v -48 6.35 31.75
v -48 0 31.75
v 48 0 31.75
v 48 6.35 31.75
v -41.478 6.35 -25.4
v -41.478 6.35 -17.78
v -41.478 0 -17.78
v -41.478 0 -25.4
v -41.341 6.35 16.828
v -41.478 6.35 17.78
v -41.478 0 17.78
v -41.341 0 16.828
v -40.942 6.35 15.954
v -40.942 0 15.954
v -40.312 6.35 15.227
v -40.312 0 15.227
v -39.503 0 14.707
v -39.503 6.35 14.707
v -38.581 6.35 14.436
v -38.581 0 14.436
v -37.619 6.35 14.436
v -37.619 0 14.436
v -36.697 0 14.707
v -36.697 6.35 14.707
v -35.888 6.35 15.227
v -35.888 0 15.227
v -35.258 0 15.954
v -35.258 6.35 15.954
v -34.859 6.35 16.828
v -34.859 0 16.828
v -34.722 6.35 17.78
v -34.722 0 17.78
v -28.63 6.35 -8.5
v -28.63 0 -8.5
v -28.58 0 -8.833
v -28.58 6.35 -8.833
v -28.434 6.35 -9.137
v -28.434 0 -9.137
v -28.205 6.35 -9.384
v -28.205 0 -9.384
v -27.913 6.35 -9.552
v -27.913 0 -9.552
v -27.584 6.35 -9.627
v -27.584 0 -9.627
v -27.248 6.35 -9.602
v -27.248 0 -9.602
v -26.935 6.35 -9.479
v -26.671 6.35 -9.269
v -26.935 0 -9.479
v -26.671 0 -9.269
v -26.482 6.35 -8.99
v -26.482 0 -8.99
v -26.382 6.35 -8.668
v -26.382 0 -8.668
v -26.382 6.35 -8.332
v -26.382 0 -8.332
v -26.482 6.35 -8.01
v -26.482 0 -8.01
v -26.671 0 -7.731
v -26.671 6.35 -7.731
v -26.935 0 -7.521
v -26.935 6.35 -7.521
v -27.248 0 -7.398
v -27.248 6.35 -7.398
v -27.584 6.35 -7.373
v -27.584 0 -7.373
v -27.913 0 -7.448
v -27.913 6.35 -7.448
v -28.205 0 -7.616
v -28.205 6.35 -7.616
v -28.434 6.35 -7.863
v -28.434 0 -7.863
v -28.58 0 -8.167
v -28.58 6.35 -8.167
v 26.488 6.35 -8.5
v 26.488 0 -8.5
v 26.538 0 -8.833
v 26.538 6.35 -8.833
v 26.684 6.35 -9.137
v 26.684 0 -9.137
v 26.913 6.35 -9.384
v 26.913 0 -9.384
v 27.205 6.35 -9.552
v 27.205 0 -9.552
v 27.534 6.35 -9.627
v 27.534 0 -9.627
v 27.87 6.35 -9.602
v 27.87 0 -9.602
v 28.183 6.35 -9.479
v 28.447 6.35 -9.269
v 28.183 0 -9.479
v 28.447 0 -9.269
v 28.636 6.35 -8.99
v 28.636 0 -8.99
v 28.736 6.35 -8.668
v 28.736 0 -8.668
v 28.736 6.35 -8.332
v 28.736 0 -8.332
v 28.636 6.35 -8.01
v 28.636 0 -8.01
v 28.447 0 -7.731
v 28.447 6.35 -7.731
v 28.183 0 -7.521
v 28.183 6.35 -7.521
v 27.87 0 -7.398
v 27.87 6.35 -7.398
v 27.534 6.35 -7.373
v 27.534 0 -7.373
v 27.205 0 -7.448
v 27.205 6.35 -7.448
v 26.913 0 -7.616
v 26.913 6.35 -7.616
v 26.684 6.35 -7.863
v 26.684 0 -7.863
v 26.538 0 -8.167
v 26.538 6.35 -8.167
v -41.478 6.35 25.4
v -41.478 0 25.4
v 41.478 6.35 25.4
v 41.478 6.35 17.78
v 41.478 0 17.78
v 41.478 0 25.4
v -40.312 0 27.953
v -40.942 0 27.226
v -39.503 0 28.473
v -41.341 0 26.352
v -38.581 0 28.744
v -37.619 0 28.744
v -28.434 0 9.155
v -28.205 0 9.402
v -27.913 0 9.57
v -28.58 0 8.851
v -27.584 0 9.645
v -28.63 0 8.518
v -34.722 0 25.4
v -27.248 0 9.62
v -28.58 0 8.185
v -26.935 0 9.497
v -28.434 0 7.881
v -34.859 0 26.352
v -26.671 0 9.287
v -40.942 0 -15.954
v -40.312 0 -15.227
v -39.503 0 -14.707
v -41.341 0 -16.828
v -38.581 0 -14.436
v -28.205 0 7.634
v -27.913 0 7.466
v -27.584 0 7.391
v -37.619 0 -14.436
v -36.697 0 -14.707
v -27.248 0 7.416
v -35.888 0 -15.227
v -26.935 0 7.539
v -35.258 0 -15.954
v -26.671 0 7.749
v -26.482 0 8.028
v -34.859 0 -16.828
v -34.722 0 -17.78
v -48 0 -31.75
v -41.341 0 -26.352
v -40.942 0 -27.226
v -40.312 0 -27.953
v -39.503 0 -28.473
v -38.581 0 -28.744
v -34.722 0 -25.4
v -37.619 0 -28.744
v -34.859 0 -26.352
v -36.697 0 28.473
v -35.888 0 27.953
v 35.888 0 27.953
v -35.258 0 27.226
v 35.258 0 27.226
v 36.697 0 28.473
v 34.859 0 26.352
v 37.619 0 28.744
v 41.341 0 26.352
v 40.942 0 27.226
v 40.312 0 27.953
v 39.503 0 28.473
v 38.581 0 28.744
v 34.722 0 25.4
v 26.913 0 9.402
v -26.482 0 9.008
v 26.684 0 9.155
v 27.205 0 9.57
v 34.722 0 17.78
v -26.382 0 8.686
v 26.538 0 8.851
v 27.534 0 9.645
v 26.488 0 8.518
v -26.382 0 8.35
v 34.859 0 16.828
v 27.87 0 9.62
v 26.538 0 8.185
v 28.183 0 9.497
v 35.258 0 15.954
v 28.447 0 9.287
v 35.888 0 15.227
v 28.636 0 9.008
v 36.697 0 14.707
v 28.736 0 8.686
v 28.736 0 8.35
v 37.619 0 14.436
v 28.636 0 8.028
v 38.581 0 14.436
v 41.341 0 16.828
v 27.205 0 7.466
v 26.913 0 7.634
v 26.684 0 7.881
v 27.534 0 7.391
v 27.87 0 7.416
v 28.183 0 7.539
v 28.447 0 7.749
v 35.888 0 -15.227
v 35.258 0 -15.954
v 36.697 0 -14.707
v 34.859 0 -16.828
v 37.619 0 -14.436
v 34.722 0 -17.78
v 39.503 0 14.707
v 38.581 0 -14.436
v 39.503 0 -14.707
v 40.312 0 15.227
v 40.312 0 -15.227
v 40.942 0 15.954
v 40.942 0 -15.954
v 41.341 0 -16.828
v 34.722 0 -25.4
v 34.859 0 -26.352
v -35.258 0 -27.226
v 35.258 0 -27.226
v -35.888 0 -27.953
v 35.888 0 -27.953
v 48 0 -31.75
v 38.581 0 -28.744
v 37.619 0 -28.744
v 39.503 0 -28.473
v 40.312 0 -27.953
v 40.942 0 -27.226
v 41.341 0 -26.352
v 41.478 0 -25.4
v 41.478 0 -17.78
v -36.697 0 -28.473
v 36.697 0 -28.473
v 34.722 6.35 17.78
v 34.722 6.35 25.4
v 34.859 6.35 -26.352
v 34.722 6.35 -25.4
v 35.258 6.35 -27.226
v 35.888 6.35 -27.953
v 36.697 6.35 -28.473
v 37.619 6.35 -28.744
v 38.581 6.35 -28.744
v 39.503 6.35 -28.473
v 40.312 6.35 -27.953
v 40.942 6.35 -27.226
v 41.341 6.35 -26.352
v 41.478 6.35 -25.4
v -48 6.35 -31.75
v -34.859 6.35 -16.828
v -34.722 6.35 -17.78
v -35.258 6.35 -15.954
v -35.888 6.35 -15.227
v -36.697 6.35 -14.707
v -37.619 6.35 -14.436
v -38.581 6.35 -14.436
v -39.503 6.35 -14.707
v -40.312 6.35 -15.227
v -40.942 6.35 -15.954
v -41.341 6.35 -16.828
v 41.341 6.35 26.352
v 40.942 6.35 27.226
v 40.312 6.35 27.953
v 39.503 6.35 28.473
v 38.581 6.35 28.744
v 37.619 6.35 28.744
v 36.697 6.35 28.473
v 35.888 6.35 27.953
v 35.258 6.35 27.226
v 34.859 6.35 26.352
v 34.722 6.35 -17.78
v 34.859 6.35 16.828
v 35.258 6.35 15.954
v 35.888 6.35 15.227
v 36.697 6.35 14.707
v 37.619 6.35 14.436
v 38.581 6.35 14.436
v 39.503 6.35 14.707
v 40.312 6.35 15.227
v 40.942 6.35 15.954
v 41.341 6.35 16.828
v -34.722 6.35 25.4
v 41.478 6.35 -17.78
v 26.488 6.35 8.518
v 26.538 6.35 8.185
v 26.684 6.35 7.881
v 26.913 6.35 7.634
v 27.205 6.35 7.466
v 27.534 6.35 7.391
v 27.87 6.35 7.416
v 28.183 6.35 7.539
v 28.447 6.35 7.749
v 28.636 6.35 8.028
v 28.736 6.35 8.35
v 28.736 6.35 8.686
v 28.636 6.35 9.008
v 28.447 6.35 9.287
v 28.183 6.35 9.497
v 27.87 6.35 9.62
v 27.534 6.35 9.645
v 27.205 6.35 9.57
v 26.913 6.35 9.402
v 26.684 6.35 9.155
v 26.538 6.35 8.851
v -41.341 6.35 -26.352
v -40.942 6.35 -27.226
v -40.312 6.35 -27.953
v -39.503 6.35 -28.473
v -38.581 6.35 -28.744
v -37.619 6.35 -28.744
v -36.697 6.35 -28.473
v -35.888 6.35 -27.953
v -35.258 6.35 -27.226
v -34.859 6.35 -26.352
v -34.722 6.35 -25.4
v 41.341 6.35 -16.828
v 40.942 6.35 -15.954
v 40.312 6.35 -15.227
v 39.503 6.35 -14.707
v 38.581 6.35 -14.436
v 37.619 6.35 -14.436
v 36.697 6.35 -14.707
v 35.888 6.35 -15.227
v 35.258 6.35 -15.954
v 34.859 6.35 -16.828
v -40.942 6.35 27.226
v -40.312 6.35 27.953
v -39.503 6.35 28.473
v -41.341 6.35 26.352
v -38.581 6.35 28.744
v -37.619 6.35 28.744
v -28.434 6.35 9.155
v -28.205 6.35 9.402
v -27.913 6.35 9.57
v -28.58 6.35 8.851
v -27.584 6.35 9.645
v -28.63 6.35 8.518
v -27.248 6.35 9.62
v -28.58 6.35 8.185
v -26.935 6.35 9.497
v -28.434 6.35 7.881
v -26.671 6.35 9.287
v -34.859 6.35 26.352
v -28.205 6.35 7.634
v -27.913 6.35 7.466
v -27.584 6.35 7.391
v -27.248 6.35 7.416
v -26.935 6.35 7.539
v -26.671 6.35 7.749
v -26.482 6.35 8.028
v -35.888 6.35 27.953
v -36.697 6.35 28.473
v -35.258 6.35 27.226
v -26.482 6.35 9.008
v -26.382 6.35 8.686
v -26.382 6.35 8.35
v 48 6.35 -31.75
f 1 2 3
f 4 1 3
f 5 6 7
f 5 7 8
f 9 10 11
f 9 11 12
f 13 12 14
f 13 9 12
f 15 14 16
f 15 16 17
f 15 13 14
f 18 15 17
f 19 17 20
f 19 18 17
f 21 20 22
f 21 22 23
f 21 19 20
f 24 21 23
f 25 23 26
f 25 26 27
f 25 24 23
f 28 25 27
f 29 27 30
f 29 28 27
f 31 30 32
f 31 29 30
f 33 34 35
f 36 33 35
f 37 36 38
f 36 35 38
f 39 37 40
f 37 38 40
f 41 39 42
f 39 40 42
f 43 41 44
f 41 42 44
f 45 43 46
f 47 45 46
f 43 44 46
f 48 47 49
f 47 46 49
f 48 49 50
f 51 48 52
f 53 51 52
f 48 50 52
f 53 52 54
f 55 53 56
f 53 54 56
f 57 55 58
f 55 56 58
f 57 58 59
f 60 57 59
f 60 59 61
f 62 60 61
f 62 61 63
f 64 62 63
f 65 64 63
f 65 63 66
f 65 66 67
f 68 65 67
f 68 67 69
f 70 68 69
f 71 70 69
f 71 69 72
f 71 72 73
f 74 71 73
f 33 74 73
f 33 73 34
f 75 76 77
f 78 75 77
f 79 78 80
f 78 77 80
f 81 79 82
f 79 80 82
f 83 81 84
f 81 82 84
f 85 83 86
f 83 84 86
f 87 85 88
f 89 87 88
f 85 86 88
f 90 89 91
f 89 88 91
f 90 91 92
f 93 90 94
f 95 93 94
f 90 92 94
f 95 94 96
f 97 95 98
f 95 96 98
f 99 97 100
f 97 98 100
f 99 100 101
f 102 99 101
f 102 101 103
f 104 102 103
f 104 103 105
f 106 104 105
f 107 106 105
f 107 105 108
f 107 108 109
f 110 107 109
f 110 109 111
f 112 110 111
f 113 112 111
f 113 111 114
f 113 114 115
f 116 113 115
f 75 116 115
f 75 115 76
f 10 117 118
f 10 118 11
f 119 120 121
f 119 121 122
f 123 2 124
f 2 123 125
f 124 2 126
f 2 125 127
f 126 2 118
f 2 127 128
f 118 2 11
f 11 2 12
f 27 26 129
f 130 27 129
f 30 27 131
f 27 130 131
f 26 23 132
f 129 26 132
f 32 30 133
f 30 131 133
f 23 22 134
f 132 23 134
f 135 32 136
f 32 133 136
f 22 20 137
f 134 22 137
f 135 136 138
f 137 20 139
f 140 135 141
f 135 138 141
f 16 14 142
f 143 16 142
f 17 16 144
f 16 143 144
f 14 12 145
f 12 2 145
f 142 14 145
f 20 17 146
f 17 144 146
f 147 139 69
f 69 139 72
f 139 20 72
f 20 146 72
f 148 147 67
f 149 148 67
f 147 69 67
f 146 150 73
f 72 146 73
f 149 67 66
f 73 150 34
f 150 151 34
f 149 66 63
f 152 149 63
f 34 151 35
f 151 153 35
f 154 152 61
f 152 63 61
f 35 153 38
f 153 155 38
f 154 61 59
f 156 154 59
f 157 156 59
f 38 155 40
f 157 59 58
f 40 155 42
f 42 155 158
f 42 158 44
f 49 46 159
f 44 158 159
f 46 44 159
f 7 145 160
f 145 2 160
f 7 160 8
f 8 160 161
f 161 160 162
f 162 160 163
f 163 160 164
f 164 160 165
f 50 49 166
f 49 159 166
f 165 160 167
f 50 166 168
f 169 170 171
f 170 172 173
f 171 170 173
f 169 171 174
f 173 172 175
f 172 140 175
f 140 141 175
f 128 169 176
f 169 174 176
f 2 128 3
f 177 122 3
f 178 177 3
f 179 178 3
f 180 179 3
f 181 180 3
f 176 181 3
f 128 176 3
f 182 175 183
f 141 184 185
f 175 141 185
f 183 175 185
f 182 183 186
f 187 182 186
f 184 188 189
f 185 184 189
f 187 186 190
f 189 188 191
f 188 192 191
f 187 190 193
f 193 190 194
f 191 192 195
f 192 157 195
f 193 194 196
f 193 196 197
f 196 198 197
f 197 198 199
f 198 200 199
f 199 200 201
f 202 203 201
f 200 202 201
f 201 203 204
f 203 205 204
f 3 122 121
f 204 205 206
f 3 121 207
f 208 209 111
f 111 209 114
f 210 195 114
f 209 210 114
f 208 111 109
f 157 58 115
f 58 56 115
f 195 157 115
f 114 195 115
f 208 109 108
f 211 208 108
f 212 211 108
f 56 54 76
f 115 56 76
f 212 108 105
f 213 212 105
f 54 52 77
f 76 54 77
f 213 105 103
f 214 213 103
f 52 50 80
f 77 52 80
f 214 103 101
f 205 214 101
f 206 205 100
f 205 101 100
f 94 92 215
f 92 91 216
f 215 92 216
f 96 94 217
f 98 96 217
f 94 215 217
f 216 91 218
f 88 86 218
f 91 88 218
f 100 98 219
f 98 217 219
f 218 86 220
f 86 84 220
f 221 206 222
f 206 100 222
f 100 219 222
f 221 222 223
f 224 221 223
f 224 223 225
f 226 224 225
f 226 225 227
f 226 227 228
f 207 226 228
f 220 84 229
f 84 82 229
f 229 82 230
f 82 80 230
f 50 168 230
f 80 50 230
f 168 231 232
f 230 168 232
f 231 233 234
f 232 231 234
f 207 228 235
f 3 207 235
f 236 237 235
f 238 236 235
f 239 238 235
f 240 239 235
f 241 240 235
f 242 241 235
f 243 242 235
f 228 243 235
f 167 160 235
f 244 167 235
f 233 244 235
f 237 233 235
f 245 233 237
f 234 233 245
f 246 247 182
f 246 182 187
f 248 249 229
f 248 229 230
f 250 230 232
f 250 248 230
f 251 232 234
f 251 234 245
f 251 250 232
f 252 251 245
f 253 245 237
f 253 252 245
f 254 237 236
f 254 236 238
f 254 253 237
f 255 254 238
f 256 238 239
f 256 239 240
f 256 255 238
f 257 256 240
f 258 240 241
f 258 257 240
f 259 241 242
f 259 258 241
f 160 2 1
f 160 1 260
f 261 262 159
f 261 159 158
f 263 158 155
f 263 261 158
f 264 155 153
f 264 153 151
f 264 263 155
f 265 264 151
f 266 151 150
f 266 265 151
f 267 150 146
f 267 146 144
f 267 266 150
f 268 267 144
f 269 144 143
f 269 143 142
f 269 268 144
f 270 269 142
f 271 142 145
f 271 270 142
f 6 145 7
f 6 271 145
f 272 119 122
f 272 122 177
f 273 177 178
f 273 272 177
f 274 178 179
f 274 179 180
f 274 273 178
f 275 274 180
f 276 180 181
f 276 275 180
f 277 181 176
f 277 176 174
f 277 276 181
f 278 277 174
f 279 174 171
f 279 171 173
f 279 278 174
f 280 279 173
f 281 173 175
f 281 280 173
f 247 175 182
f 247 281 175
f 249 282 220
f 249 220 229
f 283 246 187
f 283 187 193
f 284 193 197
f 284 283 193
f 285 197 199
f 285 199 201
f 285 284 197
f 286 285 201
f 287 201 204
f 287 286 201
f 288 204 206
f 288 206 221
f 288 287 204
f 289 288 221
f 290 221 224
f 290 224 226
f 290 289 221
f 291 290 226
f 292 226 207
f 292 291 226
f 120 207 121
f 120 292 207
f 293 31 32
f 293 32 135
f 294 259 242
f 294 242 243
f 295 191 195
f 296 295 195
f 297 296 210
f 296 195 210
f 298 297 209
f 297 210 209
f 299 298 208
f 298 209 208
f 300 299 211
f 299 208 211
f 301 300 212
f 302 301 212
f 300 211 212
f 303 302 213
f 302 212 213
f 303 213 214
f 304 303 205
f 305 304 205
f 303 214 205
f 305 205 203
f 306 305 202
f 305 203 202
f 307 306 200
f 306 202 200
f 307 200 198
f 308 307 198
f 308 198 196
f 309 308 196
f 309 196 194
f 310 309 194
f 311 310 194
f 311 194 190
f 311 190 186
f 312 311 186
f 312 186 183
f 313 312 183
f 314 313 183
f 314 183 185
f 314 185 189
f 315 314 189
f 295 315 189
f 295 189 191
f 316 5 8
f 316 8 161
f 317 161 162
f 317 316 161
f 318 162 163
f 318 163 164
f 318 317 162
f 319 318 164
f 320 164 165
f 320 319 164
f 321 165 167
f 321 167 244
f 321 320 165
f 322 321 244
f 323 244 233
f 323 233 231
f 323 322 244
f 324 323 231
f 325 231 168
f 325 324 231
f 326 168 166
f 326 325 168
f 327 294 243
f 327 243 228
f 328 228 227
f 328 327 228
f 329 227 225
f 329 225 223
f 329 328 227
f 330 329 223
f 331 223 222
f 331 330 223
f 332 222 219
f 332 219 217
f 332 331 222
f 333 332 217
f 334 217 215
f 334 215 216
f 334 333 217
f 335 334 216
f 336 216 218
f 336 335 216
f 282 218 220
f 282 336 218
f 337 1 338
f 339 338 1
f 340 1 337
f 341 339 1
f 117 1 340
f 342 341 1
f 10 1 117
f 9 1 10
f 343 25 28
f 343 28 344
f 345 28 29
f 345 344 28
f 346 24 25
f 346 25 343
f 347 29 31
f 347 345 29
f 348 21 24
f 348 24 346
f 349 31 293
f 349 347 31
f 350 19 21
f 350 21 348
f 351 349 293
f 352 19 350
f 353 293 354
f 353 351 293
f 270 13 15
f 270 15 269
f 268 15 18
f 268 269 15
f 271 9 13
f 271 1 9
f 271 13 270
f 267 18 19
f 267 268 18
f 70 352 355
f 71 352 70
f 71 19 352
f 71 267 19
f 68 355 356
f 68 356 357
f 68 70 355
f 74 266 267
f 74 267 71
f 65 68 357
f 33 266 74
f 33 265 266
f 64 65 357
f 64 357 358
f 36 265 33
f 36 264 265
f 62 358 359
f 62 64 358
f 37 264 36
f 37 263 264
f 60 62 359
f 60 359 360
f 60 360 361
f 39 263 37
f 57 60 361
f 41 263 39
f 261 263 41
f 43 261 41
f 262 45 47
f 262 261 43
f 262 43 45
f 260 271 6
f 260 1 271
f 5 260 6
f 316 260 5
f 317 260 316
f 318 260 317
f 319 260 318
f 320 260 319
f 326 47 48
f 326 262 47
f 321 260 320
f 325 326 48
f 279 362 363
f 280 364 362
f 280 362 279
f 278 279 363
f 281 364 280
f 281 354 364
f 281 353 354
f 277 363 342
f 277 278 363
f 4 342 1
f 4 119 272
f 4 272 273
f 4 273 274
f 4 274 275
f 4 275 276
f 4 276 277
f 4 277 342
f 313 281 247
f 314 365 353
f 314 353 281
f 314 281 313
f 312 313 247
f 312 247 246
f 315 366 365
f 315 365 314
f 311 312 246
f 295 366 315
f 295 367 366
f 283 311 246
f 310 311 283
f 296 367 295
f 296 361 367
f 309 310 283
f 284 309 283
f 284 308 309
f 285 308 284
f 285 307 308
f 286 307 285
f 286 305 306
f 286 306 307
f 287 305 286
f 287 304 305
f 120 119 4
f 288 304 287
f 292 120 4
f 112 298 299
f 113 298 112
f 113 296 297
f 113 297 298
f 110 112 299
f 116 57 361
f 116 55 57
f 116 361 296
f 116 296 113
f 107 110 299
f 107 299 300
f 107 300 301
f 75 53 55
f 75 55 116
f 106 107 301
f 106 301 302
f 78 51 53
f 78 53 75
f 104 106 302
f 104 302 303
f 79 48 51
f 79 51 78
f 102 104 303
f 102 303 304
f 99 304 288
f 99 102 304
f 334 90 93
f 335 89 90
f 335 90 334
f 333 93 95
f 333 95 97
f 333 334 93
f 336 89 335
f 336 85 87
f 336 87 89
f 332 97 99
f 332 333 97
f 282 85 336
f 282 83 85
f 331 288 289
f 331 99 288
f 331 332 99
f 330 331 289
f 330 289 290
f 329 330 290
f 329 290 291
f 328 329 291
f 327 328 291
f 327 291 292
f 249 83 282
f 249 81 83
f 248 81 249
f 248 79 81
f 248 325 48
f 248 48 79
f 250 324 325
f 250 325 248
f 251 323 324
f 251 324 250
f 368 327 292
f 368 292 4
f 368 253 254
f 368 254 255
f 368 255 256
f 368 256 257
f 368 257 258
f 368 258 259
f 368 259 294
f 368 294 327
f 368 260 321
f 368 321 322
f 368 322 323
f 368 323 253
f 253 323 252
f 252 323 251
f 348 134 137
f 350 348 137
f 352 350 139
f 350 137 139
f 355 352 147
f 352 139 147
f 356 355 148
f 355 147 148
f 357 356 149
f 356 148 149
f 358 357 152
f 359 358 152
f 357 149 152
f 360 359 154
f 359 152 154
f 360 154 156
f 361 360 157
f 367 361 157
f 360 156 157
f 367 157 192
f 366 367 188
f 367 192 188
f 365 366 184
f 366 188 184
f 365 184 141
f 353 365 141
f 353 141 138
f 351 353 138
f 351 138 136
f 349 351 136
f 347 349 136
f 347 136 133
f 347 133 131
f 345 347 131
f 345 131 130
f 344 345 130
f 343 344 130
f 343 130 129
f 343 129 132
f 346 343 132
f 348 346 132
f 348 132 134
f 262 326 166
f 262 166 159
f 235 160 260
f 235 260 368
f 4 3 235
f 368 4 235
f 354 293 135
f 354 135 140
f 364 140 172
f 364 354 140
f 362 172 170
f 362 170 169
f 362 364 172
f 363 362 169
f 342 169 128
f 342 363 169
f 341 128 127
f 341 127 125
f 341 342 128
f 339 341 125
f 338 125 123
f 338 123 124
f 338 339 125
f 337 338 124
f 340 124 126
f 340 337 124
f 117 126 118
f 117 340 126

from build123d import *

# Parameters (mm, degrees)
SKETCH1_W                              = 96
SKETCH1_H                              = 63.5
MOUNT_BLOCK_DEPTH                      = 6.35
LINEAR_STAGE_4_40_TAPPED_HOLE_D        = 2.2606
OPTICAL_TABLE_1_4_0_25_DIAMETER_HOLE_D = 6.35
OPTICAL_TASBLE_CUT_EXTRUDE_DEPTH       = 6.35


with BuildPart() as part:
    # Sketch1 → Mount Block (new body)
    with BuildSketch(Plane(origin=(0, 0, 0), x_dir=(1, 0, 0), z_dir=(0, 1, 0))):
        Rectangle(SKETCH1_W, SKETCH1_H)
    extrude(amount=MOUNT_BLOCK_DEPTH)

    # Linear Stage #4-40 Tapped Hole (through all)
    with Locations(Plane(origin=(0, 6.35, 0), x_dir=(1, 0, 0), z_dir=(0, 1, 0))):
        with Locations((-27.5, 8.5), (27.618, 8.5), (27.618, -8.518), (-27.5, -8.518)):
            Hole(LINEAR_STAGE_4_40_TAPPED_HOLE_D / 2)

    # Optical Table 1/4 (0.25) Diameter Hole (through all)
    with Locations(Plane(origin=(0, 6.35, 0), x_dir=(1, 0, 0), z_dir=(0, 1, 0))):
        with Locations((-38.1, 25.4), (38.1, 25.4), (38.1, -25.4), (-38.1, -25.4)):
            Hole(OPTICAL_TABLE_1_4_0_25_DIAMETER_HOLE_D / 2)

    # Sketch6 → Optical Tasble Cut-Extrude (cut)
    with BuildSketch(Plane(origin=(0, 6.35, 0), x_dir=(1, 0, 0), z_dir=(0, 1, 0))):
        with BuildLine():
            Line((-34.7218, 25.4), (-34.7218, 17.78))
            ThreePointArc((-34.7218, 17.78), (-38.1, 14.4018), (-41.4782, 17.78))
            Line((-41.4782, 17.78), (-41.4782, 25.4))
            ThreePointArc((-41.4782, 25.4), (-38.1, 28.7782), (-34.7218, 25.4))
        make_face()
        with BuildLine():
            Line((41.4782, 25.4), (41.4782, 17.78))
            ThreePointArc((41.4782, 17.78), (38.1, 14.4018), (34.7218, 17.78))
            Line((34.7218, 17.78), (34.7218, 25.4))
            ThreePointArc((34.7218, 25.4), (38.1, 28.7782), (41.4782, 25.4))
        make_face()
        with BuildLine():
            Line((41.4782, -17.78), (41.4782, -25.4))
            ThreePointArc((41.4782, -25.4), (38.1, -28.7782), (34.7218, -25.4))
            Line((34.7218, -25.4), (34.7218, -17.78))
            ThreePointArc((34.7218, -17.78), (38.1, -14.4018), (41.4782, -17.78))
        make_face()
        with BuildLine():
            Line((-34.7218, -17.78), (-34.7218, -25.4))
            ThreePointArc((-34.7218, -25.4), (-38.1, -28.7782), (-41.4782, -25.4))
            Line((-41.4782, -25.4), (-41.4782, -17.78))
            ThreePointArc((-41.4782, -17.78), (-38.1, -14.4018), (-34.7218, -17.78))
        make_face()
    extrude(amount=-OPTICAL_TASBLE_CUT_EXTRUDE_DEPTH, mode=Mode.SUBTRACT)


solid = part.part
